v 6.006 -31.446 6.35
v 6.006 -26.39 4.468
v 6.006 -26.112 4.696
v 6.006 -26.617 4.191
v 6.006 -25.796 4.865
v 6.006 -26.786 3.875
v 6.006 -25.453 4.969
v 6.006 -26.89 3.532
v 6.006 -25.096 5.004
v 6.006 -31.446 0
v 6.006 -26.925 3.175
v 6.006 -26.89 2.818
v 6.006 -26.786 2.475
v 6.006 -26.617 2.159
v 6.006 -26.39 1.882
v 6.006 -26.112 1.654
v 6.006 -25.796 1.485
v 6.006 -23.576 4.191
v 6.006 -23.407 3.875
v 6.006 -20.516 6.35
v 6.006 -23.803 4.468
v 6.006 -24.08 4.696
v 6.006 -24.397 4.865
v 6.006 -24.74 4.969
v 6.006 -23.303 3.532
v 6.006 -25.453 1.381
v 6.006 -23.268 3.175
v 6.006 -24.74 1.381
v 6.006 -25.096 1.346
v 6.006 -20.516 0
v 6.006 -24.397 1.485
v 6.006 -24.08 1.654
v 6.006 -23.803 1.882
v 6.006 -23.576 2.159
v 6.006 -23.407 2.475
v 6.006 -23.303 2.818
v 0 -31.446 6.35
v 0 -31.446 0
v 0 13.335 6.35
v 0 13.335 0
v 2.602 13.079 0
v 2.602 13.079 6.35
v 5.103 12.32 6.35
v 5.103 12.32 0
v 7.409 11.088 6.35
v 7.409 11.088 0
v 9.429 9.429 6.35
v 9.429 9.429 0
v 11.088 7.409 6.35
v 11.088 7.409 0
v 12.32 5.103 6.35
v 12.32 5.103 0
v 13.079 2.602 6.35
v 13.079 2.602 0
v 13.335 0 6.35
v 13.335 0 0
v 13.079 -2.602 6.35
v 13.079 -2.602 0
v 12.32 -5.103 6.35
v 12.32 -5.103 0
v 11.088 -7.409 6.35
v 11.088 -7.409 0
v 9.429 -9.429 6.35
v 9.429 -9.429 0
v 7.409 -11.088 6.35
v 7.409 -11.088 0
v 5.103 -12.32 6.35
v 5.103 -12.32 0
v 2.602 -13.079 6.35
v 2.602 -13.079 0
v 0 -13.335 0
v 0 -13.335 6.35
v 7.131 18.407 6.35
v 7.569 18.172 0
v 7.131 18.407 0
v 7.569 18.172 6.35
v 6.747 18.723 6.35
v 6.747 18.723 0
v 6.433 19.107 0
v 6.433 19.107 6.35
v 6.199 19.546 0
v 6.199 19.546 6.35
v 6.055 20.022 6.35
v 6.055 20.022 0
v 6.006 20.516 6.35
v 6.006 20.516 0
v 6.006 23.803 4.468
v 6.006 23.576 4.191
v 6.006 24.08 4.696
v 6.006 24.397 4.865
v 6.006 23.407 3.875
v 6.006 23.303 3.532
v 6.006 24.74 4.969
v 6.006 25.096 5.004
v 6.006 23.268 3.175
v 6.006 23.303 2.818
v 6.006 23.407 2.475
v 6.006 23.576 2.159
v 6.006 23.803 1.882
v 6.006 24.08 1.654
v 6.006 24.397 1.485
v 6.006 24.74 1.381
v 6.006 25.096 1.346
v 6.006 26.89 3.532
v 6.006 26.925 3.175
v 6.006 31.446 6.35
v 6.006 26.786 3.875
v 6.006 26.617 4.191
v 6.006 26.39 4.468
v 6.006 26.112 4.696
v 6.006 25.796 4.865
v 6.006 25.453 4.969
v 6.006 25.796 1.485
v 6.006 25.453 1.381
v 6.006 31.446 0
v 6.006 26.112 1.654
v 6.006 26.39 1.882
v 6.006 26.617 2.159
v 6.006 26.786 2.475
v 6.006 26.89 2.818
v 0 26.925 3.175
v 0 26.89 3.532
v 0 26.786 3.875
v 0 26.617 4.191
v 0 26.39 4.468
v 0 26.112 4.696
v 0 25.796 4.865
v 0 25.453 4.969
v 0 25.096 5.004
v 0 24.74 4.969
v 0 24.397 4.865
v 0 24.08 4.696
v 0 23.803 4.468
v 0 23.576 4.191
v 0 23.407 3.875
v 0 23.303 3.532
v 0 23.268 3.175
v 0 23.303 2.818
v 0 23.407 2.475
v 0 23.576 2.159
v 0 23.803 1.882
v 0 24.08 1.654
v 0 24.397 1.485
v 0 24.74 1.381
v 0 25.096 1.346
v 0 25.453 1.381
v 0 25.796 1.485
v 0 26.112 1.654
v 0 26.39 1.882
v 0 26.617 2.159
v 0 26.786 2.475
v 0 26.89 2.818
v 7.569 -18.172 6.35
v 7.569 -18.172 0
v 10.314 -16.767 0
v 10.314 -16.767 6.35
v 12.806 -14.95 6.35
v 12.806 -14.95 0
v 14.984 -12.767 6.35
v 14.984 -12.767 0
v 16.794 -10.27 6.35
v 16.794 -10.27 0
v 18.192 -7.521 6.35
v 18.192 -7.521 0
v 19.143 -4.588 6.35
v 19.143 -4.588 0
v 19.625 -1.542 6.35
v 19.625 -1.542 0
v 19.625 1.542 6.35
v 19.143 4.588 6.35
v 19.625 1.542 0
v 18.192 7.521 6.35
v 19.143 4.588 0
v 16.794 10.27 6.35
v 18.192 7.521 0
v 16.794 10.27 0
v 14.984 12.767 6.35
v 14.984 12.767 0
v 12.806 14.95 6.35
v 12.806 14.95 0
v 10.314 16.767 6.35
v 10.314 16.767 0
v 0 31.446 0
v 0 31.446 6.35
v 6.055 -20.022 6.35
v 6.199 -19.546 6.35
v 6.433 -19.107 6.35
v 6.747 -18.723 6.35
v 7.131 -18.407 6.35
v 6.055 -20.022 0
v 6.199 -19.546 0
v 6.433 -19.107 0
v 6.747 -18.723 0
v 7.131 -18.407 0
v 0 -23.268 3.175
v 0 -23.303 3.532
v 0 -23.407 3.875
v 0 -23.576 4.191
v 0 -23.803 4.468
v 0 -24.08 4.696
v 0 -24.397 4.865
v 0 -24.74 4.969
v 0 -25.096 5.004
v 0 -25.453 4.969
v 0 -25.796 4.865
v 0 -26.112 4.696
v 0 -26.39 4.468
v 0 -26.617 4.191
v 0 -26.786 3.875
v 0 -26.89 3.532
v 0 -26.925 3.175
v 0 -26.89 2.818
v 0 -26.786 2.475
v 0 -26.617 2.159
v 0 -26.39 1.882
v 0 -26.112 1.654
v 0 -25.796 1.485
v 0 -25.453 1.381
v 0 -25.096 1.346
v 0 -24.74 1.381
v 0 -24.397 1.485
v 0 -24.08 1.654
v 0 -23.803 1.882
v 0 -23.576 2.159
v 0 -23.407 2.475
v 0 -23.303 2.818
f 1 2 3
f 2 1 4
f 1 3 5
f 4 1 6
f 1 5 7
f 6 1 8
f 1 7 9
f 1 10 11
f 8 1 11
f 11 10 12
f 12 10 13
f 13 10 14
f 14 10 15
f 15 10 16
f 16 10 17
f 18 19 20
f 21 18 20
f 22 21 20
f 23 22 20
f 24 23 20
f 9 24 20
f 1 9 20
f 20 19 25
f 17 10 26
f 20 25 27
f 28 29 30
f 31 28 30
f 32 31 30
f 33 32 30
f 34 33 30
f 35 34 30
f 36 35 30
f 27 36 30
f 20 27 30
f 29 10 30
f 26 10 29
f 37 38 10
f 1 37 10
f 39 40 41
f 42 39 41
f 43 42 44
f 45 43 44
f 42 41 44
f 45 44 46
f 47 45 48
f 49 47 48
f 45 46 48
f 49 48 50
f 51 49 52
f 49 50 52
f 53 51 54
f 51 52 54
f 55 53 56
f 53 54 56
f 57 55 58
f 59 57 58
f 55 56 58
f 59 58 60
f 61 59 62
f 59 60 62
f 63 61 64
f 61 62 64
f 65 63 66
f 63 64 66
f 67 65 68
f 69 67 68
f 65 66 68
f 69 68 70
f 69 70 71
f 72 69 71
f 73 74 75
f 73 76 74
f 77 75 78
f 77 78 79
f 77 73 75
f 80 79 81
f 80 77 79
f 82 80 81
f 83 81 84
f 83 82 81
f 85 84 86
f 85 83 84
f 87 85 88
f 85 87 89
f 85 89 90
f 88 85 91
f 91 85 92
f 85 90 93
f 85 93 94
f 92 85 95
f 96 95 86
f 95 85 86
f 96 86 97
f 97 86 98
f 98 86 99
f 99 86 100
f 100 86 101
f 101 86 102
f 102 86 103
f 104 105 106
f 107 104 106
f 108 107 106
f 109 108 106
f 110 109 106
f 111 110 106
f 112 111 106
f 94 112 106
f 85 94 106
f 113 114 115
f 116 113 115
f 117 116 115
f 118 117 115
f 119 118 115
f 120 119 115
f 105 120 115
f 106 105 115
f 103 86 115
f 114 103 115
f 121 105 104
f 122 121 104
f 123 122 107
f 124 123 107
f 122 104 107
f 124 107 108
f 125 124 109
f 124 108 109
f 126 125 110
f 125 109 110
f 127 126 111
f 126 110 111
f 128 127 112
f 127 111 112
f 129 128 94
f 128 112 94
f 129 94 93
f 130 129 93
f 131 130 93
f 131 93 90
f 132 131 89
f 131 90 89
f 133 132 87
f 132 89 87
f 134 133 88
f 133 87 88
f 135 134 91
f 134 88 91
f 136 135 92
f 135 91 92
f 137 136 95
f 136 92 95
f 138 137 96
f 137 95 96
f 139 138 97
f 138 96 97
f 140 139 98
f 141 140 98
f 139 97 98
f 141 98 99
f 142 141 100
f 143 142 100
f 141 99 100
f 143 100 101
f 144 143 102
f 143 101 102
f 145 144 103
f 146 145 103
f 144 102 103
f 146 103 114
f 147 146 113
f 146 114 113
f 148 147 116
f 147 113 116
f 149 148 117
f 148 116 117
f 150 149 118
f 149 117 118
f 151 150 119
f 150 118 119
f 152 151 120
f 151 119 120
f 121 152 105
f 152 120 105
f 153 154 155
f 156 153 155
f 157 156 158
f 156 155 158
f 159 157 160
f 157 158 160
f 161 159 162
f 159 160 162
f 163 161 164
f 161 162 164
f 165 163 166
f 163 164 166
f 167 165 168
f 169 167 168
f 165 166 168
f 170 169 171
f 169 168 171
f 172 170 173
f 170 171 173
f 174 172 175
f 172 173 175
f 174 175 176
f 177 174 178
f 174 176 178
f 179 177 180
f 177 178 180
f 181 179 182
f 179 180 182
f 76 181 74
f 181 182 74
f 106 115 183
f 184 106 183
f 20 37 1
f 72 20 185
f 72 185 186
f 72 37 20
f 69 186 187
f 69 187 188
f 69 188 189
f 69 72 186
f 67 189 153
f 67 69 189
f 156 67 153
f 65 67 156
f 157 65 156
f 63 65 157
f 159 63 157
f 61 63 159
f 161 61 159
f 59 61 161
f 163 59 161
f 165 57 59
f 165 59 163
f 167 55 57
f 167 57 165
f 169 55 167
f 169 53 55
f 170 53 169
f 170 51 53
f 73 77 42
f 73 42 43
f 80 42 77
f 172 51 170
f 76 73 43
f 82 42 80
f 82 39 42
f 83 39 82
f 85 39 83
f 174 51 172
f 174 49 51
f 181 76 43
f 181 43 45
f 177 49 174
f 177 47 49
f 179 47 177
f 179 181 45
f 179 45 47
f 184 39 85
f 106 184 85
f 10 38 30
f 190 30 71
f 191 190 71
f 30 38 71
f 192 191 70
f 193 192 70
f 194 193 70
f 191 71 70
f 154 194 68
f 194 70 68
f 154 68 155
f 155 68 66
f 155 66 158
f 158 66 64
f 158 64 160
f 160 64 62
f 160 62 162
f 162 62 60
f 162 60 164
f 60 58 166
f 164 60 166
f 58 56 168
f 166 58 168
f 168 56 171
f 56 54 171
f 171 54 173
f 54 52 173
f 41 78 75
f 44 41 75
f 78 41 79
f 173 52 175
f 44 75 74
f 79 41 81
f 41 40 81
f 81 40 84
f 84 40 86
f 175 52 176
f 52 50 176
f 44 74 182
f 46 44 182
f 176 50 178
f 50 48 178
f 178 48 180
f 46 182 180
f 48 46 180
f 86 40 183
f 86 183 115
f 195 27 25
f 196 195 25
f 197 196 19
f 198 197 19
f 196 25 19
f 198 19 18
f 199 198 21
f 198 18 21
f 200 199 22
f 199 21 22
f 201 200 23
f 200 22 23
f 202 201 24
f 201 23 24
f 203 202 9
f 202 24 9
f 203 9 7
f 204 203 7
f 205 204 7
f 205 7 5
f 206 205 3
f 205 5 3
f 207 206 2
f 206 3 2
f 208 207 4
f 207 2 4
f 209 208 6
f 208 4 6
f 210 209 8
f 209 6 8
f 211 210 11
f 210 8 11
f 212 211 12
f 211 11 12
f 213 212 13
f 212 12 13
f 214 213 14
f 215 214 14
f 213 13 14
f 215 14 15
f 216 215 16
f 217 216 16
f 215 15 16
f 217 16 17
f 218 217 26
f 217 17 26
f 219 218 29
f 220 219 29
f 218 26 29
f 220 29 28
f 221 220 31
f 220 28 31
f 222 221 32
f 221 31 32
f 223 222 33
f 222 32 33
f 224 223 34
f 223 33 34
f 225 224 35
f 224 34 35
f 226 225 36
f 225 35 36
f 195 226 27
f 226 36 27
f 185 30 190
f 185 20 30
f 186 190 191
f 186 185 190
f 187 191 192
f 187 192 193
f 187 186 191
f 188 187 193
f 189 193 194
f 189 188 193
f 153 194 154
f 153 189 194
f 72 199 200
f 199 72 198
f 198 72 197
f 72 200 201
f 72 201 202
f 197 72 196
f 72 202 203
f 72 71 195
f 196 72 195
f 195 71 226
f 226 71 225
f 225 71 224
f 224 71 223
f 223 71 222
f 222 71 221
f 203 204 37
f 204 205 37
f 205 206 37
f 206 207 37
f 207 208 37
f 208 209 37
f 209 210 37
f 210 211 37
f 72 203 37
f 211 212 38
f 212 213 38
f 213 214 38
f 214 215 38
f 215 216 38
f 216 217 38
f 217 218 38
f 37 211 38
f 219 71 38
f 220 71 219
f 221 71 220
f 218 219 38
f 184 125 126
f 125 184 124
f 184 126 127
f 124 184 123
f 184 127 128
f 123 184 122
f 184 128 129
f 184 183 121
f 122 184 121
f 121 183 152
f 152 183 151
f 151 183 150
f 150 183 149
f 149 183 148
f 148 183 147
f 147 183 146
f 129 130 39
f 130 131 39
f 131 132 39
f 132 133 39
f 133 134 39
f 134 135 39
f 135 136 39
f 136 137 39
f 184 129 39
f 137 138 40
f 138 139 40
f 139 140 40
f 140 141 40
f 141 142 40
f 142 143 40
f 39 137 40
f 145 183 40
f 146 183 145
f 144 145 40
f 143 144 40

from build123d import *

# Parameters (mm, degrees)
F1_DEPTH = 6.35
F2_R     = 1.8288
F3_R     = 1.8288
F4_DEPTH = 6.005883
F5_R     = 2.54


with BuildPart() as f1:
    # F0 (on Top) → F1 (new body)
    with BuildSketch(Plane.XY):
        with BuildLine():
            ThreePointArc((0, 13.335), (13.335, 0), (0, -13.335))
            Line((0, -13.335), (0, -31.446429))
            Line((0, -31.446429), (6.005883, -31.446429))
            Line((6.005883, -31.446429), (6.005883, -18.746429))
            ThreePointArc((6.005883, -18.746429), (19.685, 0), (6.005883, 18.746429))
            Line((6.005883, 18.746429), (6.005883, 31.446429))
            Line((6.005883, 31.446429), (0, 31.446429))
            Line((0, 31.446429), (0, 13.335))
        make_face()
    extrude(amount=F1_DEPTH)

    # F2 (on face) + F3 (on face) → F4 (cut, through all)
    with BuildSketch(Plane.YZ.offset(6.005883)):
        with Locations((-25.096429, 3.175)):
            Circle(F2_R)
    with BuildSketch(Plane.YZ.offset(6.005883)):
        with Locations((25.096429, 3.175)):
            Circle(F3_R)
    extrude(amount=-F4_DEPTH, mode=Mode.SUBTRACT)

    # F5
    f5_edges = [f1.edges().sort_by_distance(p)[0] for p in [
        (6.005883, -18.746429, 3.175),
        (6.005883, 18.746429, 3.175),
    ]]
    fillet(f5_edges, radius=F5_R)


solid = f1.part
